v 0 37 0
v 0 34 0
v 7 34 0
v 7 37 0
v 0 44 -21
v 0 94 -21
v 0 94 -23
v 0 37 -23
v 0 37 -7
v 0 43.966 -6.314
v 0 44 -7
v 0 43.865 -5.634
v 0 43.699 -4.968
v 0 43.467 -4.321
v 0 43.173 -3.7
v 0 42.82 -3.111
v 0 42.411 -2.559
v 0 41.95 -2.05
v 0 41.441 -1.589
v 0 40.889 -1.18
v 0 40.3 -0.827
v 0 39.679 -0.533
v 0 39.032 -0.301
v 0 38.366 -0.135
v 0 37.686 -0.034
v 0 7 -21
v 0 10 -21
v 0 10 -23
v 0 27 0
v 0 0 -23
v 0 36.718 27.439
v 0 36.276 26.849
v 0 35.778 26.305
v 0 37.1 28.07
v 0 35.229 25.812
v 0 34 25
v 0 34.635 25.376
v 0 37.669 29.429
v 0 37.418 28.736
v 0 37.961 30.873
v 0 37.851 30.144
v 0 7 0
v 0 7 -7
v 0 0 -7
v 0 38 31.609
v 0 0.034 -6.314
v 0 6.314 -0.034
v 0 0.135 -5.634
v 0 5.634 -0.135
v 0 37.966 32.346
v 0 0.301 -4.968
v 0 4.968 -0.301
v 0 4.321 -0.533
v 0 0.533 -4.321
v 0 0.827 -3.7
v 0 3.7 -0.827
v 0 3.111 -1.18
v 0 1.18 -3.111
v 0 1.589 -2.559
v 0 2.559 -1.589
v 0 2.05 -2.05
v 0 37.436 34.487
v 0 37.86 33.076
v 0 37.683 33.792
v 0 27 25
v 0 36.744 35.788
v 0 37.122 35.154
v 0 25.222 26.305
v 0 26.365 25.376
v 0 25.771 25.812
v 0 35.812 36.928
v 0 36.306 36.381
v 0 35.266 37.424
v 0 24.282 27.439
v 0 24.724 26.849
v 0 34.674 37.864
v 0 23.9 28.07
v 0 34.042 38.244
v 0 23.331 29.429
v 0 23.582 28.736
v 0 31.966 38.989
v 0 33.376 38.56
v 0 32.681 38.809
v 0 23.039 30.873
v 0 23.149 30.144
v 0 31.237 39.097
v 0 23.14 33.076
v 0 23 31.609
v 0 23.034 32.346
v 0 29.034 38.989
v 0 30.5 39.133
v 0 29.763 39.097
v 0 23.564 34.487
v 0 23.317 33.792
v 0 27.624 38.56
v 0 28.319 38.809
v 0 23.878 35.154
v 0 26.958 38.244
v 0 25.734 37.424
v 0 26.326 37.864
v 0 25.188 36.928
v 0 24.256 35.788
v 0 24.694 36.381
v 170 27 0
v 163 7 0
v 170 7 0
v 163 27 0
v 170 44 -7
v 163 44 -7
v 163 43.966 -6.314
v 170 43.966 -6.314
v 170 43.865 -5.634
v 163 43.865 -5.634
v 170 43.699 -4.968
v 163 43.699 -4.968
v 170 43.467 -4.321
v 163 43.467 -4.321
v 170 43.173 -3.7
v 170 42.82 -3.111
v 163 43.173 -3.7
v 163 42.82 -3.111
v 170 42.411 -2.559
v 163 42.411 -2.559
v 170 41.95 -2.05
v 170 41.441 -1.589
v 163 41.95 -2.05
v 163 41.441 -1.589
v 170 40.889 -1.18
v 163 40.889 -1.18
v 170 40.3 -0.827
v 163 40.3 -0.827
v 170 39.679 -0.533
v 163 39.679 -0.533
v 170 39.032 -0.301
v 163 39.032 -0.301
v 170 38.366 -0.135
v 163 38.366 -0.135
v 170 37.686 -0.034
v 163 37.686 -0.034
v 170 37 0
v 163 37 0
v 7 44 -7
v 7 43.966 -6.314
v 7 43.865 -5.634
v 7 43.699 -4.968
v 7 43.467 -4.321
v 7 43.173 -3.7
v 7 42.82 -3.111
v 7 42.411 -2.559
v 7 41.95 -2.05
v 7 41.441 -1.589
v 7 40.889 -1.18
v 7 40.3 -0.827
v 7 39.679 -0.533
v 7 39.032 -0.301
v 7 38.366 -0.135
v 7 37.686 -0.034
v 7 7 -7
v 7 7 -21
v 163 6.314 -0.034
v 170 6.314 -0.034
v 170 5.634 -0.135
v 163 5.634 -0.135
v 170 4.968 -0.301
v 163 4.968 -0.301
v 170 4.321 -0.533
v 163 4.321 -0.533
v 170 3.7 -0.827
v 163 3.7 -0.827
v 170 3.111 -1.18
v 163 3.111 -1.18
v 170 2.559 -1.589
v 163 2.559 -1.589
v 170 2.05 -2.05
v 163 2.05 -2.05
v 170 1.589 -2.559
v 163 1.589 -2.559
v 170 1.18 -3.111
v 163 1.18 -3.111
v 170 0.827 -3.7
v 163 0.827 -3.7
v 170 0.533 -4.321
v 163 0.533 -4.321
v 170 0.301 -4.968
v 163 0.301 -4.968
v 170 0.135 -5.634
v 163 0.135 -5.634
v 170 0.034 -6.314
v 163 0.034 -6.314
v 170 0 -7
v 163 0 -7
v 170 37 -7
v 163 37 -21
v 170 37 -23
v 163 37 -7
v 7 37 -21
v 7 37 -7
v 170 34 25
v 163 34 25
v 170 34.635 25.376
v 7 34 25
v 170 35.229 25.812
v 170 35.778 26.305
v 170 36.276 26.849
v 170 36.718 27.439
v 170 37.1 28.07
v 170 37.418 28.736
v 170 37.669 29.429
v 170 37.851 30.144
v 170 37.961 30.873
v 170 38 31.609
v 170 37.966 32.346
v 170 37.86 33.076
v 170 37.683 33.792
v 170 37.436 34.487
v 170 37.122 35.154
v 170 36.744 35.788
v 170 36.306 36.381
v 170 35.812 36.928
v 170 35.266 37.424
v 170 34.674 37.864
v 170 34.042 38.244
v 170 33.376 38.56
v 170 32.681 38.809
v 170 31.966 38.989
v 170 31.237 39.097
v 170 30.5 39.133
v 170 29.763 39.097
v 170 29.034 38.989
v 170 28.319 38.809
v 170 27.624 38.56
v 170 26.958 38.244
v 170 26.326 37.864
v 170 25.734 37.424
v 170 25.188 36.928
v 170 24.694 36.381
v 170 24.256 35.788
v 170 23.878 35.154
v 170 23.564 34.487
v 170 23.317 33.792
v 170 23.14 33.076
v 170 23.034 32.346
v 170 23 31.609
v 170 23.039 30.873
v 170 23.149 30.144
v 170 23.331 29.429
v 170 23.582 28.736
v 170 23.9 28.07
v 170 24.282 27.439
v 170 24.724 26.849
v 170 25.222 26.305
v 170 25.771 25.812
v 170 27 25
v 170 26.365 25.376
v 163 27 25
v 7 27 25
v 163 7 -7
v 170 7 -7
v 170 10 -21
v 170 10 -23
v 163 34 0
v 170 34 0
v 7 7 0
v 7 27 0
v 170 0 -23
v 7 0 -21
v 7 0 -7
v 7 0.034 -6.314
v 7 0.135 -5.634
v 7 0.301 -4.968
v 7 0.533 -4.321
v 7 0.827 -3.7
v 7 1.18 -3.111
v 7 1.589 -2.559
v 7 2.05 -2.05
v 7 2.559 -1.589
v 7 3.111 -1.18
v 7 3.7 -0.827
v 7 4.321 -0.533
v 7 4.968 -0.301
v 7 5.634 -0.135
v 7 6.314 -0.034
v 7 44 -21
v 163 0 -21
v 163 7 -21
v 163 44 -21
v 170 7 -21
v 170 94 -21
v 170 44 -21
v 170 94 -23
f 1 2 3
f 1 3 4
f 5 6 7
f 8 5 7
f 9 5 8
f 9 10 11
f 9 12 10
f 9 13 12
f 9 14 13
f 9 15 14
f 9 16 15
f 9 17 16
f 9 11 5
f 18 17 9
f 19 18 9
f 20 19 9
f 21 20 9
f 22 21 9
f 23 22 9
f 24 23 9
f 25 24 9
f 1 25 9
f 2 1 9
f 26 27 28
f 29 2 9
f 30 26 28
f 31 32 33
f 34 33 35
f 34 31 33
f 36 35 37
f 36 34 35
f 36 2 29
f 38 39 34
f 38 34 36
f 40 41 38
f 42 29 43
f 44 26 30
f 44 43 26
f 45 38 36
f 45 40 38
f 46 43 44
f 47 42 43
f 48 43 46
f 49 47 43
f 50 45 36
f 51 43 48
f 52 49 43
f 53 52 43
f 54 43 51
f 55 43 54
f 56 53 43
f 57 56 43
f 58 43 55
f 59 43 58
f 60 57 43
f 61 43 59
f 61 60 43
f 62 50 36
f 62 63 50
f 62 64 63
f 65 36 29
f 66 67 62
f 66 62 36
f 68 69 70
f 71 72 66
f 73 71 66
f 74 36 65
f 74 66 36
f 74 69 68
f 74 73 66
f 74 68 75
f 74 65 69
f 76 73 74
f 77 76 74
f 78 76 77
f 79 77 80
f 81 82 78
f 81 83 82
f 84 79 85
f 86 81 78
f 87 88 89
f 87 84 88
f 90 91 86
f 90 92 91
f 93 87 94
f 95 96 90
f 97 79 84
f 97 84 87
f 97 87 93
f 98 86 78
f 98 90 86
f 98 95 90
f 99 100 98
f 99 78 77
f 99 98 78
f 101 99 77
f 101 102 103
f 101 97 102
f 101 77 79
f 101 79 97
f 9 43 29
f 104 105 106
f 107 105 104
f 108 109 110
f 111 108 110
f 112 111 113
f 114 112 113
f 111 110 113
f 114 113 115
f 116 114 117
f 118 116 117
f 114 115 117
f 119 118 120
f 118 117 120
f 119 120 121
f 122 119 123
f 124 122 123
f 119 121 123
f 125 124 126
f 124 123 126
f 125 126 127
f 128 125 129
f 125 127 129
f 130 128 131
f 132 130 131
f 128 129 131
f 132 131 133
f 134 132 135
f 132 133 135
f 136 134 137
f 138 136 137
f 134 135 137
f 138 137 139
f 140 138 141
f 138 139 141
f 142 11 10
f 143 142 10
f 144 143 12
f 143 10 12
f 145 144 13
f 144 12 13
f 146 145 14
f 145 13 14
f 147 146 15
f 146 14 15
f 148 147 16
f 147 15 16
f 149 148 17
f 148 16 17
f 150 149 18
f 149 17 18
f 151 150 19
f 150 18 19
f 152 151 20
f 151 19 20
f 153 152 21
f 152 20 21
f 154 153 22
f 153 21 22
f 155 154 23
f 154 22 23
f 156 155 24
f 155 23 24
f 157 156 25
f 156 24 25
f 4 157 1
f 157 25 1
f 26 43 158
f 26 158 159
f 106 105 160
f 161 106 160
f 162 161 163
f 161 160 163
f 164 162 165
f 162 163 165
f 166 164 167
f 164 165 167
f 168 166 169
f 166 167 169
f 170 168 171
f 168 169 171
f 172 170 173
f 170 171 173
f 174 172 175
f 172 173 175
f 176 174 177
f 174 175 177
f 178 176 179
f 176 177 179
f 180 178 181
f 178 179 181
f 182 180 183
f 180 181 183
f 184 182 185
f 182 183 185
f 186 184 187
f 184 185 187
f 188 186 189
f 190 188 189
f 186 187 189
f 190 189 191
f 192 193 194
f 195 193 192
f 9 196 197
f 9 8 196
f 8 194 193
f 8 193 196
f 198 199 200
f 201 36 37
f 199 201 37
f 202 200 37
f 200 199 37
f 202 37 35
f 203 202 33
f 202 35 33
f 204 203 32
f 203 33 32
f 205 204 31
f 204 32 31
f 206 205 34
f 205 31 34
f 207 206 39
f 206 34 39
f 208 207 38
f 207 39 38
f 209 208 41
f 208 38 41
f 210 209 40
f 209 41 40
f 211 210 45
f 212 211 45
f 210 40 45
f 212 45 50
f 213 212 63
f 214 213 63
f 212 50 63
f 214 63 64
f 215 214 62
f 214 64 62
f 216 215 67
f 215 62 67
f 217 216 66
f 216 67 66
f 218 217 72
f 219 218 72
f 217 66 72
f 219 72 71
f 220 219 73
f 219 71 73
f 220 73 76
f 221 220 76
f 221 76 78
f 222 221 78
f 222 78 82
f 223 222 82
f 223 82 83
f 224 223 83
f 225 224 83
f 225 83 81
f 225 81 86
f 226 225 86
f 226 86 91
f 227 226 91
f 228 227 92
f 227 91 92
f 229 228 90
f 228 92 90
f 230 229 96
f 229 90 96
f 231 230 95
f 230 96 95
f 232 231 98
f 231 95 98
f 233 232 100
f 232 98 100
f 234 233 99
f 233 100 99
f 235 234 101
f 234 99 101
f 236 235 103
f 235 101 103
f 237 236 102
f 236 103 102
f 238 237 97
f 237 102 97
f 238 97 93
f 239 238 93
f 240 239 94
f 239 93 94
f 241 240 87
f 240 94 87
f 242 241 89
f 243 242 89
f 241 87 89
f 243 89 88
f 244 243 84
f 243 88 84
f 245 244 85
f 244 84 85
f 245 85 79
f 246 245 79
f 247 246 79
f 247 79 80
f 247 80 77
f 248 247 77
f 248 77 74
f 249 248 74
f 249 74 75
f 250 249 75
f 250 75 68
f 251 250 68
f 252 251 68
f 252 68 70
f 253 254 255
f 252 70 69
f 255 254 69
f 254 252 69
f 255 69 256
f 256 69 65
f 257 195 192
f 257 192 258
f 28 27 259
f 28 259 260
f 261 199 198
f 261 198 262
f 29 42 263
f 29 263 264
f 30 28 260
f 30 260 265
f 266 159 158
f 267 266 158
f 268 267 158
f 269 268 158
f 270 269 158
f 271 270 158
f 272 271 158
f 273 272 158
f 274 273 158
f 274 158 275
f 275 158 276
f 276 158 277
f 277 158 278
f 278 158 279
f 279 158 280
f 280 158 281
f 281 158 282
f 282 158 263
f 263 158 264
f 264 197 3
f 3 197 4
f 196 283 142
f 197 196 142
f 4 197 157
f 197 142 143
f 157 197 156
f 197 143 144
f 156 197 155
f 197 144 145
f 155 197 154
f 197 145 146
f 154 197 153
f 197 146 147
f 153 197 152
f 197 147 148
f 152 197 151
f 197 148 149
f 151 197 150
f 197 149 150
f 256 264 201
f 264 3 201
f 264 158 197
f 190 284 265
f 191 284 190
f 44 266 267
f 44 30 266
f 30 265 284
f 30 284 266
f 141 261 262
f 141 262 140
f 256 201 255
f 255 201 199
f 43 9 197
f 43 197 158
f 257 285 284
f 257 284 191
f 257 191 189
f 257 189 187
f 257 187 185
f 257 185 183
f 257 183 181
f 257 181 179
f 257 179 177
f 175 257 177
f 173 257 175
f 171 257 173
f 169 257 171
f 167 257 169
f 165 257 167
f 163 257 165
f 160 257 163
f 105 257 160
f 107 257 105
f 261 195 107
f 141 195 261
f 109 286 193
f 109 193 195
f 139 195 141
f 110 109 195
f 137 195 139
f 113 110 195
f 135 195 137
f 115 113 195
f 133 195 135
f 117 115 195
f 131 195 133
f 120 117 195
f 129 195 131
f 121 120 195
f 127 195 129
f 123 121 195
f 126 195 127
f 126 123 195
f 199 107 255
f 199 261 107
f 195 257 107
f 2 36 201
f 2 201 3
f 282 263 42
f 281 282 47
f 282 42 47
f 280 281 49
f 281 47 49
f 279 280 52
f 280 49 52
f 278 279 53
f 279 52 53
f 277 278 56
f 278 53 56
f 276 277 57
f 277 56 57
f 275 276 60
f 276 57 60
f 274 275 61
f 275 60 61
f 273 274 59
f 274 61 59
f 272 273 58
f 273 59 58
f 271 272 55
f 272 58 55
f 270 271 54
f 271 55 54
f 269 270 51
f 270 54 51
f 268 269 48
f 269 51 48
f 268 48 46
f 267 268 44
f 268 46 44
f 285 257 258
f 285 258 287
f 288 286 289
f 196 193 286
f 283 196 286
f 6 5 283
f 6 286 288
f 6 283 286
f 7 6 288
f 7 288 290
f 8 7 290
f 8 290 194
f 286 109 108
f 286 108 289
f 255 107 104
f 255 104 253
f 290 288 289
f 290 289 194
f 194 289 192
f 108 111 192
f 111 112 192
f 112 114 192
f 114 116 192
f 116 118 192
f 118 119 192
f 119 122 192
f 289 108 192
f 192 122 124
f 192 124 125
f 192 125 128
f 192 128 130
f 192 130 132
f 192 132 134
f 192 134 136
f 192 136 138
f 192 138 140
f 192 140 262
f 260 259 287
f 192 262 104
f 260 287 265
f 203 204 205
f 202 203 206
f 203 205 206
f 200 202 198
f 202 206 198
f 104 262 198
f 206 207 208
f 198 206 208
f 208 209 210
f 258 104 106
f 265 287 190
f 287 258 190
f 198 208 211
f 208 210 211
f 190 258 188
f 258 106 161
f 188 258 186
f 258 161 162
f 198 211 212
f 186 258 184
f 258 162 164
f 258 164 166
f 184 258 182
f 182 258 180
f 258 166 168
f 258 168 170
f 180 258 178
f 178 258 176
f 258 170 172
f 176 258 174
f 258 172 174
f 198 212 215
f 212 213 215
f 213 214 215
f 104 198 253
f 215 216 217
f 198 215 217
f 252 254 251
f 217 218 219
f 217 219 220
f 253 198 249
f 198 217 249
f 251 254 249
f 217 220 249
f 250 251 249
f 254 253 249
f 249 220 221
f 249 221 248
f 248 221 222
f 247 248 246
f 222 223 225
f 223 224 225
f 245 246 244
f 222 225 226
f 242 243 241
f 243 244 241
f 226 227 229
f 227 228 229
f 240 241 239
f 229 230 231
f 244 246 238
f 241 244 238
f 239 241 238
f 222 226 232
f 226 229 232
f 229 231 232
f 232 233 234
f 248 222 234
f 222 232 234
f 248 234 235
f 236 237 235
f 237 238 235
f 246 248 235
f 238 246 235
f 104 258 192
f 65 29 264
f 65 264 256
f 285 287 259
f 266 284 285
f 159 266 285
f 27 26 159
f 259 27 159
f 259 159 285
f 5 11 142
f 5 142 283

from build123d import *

# Parameters (mm, degrees)
PAD_DEPTH    = 170
SKETCH001_W  = 46
SKETCH001_H  = 156
POCKET_DEPTH = 44.001


with BuildPart() as part:
    # Sketch → Pad (new body)
    with BuildSketch(Plane.YZ):
        with BuildLine():
            Line((7, 0), (27, 0))
            Line((27, 0), (27, 25))
            ThreePointArc((34, 25), (30.5, 39.13325), (27, 25))
            Line((34, 25), (34, 0))
            Line((34, 0), (37, 0))
            ThreePointArc((44, -7), (41.949747, -2.050253), (37, 0))
            Line((44, -7), (44, -21))
            Line((44, -21), (94, -21))
            Line((94, -21), (94, -23))
            Line((94, -23), (37, -23))
            Line((37, -23), (37, -7))
            Line((37, -7), (7, -7))
            Line((7, -7), (7, -21))
            Line((7, -21), (10, -21))
            Line((10, -21), (10, -23))
            Line((10, -23), (0, -23))
            Line((0, -23), (0, -7))
            ThreePointArc((7, 0), (2.050253, -2.050253), (0, -7))
        make_face()
    extrude(amount=PAD_DEPTH)

    # Sketch001 (on Face7 of Pad) → Pocket (cut, through all)
    with BuildSketch(Plane.ZX.offset(44)):
        with Locations((2, 85)):
            Rectangle(SKETCH001_W, SKETCH001_H)
    extrude(amount=-POCKET_DEPTH, mode=Mode.SUBTRACT)


solid = part.part
